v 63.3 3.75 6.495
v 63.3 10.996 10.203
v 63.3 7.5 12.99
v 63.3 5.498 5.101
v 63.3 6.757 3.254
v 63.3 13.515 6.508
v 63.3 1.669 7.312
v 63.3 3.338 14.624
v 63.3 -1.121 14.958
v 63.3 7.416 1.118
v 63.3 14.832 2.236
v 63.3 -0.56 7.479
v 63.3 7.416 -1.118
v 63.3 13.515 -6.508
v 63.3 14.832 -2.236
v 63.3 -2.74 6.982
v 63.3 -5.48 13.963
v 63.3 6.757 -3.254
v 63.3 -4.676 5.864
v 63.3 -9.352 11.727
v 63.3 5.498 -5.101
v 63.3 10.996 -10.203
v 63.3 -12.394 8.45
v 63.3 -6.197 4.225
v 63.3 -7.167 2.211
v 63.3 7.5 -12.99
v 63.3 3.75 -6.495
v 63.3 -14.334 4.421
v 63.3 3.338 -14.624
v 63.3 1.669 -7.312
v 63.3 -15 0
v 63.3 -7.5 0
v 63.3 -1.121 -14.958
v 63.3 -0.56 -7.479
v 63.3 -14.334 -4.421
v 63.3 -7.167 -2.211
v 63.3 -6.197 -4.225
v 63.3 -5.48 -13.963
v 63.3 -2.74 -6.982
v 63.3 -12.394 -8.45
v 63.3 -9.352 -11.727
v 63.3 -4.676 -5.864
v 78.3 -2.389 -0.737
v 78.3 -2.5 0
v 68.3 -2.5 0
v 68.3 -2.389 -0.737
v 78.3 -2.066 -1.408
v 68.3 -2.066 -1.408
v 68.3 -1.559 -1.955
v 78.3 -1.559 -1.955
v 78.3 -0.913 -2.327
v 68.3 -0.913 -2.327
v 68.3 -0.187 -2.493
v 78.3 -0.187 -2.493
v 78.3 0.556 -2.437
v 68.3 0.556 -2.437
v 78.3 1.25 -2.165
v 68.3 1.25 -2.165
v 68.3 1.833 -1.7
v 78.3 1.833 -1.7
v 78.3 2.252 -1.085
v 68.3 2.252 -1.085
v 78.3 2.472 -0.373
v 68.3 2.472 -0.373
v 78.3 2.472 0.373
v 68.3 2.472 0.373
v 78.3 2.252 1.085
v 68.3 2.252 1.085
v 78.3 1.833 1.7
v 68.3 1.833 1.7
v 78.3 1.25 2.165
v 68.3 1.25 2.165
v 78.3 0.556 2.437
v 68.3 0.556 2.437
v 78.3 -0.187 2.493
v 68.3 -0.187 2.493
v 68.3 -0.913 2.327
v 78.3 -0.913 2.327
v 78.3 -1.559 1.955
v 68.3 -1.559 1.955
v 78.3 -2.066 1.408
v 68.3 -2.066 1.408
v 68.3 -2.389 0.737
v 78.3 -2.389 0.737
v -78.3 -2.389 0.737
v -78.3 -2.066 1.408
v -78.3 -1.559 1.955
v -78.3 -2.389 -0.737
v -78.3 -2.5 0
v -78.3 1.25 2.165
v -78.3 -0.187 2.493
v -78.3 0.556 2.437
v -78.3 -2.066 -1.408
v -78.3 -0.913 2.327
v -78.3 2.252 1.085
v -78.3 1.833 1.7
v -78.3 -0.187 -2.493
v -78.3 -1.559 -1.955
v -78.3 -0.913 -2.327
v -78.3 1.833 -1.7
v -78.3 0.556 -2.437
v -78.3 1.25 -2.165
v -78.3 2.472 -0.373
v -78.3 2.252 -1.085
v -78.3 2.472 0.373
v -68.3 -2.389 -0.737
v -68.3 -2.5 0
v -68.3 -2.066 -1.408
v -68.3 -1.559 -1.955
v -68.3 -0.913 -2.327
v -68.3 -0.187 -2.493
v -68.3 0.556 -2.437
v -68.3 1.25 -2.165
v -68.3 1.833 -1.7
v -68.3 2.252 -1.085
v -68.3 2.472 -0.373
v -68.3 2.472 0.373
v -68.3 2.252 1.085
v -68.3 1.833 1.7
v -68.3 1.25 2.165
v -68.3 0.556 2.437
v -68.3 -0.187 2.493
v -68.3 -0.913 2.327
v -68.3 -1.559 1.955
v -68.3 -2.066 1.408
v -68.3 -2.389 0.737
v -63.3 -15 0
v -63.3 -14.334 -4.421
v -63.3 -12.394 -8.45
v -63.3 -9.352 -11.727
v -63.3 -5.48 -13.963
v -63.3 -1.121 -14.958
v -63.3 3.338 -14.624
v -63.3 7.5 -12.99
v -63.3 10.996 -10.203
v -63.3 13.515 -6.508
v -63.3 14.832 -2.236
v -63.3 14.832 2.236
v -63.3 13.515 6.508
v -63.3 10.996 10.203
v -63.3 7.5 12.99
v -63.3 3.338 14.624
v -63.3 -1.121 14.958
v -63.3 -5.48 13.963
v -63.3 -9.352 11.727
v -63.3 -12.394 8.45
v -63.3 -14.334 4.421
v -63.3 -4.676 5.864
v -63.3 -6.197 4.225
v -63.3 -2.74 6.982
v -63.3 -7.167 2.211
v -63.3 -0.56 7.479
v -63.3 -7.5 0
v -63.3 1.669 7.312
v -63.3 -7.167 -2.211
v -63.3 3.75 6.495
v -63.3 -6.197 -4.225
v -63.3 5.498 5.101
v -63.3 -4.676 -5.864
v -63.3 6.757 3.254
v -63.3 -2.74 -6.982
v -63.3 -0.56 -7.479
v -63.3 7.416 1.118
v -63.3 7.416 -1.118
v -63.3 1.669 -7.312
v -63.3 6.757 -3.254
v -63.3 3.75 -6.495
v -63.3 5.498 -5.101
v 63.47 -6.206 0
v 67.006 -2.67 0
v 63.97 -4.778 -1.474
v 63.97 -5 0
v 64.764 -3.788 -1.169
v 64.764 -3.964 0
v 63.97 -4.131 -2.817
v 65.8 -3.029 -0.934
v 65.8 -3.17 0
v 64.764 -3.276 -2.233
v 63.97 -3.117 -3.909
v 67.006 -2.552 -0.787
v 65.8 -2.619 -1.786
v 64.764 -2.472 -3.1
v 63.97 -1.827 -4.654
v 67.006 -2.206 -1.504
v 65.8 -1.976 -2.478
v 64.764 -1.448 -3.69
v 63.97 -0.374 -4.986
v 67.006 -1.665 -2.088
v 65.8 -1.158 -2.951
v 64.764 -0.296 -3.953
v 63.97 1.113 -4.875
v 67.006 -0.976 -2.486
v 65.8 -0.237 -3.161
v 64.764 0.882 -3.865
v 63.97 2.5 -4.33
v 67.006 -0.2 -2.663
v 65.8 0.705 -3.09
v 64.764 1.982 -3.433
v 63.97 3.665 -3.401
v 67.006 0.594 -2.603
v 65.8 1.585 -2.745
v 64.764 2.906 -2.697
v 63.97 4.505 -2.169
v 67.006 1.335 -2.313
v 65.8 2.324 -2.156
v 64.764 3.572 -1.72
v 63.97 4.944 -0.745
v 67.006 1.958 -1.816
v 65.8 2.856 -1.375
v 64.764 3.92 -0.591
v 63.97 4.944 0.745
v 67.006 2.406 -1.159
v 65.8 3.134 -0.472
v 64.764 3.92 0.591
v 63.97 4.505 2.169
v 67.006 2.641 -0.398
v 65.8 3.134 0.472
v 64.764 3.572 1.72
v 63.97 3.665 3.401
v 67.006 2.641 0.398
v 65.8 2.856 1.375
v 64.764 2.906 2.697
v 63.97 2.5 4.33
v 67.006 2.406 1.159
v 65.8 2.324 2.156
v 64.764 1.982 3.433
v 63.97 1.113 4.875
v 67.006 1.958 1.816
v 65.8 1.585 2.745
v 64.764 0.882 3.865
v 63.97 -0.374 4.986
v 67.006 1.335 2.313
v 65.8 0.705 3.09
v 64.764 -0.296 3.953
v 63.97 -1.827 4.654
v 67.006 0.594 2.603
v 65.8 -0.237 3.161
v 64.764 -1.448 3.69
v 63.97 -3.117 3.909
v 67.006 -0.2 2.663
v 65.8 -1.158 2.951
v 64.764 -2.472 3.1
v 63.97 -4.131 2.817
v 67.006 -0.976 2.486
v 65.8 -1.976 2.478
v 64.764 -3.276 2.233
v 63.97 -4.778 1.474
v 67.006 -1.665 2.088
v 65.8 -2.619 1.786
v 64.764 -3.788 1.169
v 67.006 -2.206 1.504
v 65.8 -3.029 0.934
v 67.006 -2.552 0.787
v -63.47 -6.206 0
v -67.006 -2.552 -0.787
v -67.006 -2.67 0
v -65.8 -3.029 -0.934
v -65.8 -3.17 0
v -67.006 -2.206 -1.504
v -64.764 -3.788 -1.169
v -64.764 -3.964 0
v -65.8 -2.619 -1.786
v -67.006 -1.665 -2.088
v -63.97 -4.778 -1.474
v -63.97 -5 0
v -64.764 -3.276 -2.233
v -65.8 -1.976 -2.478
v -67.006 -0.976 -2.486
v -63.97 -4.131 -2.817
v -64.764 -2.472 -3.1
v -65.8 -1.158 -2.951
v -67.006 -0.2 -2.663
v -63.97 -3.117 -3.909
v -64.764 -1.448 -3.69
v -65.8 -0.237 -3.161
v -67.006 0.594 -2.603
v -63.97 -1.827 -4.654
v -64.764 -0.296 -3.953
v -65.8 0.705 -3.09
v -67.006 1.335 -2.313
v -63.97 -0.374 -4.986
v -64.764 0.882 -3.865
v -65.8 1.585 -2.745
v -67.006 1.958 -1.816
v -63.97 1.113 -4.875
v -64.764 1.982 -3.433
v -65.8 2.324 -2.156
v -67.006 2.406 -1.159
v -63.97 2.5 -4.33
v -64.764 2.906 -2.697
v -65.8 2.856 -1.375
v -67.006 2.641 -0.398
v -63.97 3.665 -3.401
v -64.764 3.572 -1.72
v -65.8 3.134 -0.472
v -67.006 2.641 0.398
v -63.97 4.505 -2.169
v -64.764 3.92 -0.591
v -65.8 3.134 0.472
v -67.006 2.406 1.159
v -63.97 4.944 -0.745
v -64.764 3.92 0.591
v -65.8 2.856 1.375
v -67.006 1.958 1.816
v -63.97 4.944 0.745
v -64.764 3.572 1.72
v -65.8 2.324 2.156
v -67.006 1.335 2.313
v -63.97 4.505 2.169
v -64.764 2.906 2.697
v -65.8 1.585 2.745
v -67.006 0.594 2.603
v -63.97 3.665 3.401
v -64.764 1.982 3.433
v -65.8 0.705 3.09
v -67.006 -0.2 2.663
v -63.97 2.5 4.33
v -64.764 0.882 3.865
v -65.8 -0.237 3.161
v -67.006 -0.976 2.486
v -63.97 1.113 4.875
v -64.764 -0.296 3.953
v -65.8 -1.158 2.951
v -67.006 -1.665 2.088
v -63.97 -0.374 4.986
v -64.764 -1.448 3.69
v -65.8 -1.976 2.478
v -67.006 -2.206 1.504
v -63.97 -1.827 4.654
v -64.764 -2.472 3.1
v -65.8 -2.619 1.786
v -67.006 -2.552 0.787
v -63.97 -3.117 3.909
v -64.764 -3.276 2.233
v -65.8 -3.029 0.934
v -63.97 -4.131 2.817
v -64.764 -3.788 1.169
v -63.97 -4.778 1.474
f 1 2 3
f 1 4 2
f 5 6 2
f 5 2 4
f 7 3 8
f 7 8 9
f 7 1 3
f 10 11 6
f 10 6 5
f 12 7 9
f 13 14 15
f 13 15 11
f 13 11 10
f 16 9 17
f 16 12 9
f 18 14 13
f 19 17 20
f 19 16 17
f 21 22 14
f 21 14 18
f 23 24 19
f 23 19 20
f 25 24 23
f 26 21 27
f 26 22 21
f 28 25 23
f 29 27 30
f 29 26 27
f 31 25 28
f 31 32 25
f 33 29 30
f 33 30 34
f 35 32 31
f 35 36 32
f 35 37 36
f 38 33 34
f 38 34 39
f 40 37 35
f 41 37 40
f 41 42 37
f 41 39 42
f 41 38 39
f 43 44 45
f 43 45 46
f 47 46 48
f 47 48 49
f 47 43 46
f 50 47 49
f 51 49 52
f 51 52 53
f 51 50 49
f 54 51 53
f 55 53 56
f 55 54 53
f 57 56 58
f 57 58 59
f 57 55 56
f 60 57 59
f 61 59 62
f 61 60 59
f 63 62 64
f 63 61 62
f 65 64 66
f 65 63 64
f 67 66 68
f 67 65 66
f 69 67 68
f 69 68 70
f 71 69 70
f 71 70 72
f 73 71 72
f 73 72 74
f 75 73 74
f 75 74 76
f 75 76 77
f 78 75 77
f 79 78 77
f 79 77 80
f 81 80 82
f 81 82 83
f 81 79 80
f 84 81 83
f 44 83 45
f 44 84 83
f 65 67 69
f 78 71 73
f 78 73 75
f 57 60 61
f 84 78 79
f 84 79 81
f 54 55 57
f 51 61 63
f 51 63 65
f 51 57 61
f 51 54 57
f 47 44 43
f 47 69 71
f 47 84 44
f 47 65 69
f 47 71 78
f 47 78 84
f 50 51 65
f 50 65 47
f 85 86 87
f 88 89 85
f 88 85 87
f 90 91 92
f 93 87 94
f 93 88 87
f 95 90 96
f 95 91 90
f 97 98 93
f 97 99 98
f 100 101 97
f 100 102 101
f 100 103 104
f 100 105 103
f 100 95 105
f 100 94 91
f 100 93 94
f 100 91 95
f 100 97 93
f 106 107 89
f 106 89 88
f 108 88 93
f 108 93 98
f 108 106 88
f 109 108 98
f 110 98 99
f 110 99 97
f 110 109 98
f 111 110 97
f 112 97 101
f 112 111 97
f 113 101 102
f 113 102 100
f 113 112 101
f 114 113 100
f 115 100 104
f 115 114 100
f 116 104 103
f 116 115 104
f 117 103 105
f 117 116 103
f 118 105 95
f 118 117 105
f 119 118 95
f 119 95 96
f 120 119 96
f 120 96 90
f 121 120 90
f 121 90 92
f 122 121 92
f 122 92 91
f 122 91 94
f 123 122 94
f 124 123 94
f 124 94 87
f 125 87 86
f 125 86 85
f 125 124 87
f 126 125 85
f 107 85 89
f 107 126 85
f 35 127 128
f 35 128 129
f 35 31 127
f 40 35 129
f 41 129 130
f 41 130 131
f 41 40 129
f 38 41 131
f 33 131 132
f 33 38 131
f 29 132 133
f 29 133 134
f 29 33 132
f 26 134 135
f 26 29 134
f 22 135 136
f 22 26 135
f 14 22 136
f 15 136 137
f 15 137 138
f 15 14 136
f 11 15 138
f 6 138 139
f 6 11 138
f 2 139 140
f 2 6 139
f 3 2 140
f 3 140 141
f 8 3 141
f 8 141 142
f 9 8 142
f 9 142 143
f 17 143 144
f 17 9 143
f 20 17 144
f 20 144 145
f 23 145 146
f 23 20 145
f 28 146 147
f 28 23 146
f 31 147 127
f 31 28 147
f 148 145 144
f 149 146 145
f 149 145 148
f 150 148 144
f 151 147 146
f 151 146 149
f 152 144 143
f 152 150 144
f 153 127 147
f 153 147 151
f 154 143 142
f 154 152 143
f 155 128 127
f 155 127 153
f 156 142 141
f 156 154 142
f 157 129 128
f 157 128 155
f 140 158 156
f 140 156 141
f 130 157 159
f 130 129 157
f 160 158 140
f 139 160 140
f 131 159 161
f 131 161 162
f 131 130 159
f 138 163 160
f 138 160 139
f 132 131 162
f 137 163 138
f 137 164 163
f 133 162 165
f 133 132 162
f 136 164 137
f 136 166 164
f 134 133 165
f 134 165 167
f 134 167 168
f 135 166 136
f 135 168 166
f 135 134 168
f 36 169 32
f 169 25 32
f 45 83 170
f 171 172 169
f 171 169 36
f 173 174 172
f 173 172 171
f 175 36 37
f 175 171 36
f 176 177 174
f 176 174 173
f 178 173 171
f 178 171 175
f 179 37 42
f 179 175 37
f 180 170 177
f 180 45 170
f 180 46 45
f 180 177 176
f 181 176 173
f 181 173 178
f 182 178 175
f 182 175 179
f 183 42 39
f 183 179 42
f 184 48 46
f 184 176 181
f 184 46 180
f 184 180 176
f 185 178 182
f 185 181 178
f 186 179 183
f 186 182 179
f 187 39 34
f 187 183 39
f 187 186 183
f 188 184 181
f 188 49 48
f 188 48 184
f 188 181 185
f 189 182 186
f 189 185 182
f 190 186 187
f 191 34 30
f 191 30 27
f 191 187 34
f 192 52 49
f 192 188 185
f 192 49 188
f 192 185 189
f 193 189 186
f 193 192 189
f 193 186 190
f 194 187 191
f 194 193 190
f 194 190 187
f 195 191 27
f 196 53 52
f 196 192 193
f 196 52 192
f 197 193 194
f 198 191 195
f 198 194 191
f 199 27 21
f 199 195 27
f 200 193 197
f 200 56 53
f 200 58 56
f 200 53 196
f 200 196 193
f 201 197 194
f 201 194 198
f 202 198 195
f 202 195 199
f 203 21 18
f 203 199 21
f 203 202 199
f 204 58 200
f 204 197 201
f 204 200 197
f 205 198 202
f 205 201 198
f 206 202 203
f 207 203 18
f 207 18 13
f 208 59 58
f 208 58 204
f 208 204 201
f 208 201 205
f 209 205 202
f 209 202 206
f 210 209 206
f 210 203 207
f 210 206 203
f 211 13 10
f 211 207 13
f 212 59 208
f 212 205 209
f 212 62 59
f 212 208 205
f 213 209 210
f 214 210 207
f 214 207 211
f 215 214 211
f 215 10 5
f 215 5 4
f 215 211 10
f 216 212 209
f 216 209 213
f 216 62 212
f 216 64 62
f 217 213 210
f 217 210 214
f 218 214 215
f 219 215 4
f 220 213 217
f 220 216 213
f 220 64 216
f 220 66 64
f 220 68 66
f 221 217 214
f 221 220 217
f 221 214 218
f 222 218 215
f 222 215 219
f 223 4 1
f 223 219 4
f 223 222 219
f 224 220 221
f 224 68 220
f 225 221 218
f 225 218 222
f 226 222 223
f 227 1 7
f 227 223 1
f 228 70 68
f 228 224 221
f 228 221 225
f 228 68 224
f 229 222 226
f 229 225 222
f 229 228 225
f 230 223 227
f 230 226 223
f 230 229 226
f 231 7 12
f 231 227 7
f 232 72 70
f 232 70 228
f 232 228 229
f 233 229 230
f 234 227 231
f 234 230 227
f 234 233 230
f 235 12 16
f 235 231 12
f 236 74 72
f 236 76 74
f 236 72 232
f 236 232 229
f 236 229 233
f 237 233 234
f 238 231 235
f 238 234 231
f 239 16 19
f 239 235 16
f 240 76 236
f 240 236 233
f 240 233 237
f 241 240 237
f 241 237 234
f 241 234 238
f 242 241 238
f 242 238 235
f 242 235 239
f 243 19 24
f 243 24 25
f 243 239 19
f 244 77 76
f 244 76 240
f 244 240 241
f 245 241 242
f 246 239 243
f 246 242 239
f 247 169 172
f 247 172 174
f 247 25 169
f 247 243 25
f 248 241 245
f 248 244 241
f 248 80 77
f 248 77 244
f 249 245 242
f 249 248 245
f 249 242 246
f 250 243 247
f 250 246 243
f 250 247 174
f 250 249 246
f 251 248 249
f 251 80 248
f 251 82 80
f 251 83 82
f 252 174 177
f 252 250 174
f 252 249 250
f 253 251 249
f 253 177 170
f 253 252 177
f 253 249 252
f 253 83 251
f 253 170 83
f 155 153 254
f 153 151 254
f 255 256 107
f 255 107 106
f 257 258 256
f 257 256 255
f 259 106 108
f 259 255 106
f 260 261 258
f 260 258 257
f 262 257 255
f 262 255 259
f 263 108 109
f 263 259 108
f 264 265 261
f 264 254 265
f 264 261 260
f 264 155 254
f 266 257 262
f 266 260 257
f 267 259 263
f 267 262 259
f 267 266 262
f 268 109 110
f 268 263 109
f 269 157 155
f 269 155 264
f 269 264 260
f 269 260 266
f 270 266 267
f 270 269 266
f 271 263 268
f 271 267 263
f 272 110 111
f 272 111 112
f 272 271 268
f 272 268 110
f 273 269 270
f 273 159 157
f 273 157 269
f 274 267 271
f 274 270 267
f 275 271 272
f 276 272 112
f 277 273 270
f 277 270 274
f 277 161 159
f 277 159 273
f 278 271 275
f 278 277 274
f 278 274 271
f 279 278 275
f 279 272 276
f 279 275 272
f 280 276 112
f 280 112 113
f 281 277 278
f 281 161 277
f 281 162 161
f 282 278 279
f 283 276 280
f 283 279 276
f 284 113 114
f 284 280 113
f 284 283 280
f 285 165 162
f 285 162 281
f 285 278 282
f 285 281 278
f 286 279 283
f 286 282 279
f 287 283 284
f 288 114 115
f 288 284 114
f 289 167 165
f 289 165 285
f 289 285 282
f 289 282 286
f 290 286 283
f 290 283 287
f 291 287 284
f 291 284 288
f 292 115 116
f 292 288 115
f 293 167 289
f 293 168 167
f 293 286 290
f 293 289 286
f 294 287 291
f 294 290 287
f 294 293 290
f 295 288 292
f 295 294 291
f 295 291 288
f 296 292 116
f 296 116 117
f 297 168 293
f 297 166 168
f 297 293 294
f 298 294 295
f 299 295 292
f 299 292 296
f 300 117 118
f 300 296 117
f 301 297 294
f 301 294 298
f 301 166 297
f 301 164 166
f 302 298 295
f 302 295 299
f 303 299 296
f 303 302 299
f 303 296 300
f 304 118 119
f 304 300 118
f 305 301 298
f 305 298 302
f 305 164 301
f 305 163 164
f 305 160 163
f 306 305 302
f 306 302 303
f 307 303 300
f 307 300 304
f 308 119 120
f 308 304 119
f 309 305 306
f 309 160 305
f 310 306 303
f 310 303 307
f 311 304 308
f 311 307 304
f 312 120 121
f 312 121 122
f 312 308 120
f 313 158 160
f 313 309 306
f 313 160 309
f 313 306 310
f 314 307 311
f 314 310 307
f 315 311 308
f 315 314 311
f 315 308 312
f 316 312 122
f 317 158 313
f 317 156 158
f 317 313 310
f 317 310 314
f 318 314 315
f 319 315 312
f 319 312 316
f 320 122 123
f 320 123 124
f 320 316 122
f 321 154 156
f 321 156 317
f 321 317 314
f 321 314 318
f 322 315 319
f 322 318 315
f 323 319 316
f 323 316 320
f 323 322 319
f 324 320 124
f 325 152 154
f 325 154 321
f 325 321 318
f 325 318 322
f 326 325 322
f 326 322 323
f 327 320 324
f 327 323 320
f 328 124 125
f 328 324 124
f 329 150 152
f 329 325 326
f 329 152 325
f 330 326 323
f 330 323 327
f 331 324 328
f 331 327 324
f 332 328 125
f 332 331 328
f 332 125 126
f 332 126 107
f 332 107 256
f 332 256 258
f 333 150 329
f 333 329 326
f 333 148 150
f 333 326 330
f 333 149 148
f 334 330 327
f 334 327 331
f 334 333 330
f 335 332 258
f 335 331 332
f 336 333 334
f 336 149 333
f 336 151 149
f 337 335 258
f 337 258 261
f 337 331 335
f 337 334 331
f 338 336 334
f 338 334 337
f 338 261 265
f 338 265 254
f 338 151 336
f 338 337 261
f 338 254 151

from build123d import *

# Parameters (mm, degrees)
CONG_1_R = 5


with BuildPart() as part:
    # Esquisse1 → Révolution1 (revolve)
    with BuildSketch(Plane.XY, mode=Mode.PRIVATE) as r_volution1_sk:
        Polygon((-78.3, 0), (-78.3, 2.5), (-63.3, 2.5), (-63.3, 15), (63.3, 15), (63.3, 2.5), (78.3, 2.5), (78.3, 0), align=None)
    revolve(r_volution1_sk.sketch.rotate(Axis((-78.3, 0, 0), (1, 0, 0)), 180), axis=Axis((-78.3, 0, 0), (1, 0, 0)))

    # Congé1
    cong_1_edges = [part.edges().sort_by_distance(p)[0] for p in [
        (-63.3, 2.5, 0),
        (63.3, 2.5, 0),
    ]]
    fillet(cong_1_edges, radius=CONG_1_R)


solid = part.part
